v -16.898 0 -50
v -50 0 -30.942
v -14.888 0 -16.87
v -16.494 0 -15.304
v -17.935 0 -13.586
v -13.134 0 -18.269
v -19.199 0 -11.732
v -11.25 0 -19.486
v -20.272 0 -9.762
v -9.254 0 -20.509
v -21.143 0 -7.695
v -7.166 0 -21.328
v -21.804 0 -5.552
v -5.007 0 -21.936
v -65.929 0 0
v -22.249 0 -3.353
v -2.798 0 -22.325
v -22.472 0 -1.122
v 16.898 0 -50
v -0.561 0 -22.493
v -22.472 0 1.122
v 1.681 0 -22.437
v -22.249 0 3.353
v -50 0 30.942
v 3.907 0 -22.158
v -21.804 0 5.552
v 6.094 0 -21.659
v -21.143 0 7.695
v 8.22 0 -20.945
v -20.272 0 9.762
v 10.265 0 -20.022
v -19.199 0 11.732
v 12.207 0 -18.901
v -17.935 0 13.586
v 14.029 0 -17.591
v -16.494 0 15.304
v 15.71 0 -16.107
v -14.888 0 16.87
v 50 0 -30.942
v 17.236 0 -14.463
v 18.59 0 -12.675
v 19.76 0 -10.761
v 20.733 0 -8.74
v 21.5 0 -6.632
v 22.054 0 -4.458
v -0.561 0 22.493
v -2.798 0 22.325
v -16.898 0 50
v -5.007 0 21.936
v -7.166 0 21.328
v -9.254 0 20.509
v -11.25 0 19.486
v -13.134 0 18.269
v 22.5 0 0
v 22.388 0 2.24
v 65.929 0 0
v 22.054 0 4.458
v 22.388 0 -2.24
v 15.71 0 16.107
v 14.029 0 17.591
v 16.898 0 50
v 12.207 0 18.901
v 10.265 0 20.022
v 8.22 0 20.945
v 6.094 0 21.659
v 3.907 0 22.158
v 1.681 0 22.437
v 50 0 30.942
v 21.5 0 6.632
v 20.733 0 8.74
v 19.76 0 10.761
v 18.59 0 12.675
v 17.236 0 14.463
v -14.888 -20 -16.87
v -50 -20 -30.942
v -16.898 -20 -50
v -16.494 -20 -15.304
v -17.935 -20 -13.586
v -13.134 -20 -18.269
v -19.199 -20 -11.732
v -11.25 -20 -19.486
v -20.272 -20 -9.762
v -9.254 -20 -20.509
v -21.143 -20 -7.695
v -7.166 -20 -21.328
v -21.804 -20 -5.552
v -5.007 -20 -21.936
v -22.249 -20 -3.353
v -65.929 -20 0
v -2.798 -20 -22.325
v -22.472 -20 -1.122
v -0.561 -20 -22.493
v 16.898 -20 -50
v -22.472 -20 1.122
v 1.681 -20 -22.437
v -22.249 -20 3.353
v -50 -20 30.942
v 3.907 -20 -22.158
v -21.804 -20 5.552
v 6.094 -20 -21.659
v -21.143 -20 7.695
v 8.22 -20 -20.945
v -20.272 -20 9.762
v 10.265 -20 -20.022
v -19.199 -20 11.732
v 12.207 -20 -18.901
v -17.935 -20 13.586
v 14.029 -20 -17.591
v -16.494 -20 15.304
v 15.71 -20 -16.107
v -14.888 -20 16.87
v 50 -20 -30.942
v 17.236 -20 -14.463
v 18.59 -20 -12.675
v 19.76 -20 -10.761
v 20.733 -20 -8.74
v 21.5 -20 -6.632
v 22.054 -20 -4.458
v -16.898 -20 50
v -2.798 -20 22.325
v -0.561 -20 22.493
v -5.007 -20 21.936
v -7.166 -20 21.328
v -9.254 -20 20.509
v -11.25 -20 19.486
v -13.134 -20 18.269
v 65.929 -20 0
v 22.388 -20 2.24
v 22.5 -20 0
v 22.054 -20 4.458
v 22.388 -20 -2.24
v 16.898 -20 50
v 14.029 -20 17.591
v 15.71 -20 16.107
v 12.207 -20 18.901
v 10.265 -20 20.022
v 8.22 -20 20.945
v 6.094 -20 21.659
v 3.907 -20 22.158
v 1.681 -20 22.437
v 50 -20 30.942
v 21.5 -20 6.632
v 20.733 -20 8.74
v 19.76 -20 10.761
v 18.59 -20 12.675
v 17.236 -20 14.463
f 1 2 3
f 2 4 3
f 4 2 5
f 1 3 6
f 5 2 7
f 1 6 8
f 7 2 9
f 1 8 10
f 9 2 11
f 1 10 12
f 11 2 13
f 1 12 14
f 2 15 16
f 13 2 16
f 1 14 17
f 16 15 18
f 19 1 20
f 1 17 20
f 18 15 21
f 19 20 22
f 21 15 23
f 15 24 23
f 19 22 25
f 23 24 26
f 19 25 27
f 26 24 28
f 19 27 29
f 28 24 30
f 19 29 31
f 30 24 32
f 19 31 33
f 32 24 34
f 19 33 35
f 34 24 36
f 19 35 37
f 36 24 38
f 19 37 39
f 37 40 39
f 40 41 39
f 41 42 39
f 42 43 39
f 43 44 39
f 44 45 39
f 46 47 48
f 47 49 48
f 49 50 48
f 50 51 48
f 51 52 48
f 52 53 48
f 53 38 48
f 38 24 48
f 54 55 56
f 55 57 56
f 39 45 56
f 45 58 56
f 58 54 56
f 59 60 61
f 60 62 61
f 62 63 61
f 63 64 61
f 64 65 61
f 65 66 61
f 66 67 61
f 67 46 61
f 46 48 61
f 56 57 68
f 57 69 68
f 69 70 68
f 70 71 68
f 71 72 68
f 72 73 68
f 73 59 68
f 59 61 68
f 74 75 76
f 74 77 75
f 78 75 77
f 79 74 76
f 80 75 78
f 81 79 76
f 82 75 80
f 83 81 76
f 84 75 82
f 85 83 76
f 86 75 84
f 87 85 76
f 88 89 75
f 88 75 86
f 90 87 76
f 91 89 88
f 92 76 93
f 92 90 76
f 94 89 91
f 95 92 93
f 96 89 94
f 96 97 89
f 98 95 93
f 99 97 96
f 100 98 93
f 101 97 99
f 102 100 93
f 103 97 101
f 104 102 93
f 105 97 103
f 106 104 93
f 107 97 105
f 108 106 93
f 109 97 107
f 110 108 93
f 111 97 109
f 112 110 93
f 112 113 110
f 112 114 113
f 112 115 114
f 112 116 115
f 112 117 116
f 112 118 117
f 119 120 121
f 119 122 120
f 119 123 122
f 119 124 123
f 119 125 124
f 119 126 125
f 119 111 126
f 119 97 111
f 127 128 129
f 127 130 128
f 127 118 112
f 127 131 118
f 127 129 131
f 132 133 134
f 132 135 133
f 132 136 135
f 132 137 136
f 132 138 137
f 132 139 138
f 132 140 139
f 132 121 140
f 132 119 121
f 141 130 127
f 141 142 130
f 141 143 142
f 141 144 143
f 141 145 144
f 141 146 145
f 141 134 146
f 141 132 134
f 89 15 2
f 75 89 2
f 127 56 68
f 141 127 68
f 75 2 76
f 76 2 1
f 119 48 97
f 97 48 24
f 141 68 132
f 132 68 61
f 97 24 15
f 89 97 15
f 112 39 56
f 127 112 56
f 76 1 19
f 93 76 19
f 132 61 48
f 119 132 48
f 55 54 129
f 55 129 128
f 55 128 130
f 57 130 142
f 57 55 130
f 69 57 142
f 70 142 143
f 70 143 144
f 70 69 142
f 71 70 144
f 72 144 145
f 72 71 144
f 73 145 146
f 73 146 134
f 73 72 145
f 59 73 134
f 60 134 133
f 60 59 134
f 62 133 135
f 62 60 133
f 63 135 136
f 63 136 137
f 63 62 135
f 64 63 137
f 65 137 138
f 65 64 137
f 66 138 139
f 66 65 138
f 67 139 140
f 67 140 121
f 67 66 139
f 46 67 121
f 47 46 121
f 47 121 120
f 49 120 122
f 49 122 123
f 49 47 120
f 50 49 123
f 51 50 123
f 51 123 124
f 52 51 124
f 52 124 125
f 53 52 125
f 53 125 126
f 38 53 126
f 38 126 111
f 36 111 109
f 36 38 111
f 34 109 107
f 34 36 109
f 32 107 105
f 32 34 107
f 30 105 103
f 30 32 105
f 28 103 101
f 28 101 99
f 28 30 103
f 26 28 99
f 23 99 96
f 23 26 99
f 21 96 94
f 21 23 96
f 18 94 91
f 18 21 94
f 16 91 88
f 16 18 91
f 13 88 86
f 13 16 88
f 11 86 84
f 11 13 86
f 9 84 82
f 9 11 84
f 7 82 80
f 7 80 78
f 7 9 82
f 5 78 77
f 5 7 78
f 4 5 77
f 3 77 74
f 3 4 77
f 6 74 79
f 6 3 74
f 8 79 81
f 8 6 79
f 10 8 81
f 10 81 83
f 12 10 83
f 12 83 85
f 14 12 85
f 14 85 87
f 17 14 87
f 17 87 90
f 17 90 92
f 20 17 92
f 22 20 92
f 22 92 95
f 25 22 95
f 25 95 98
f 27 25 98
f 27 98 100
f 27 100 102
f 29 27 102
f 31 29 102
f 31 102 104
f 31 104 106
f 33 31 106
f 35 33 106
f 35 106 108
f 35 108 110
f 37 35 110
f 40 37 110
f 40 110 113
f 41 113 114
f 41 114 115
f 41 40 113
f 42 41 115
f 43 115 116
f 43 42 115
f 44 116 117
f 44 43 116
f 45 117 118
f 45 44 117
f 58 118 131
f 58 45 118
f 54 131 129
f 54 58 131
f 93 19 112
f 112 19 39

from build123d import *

# Parameters (mm, degrees)
F0_R     = 22.5
F1_DEPTH = 20


with BuildPart() as f1:
    # F0 (on Front) → F1 (new body)
    with BuildSketch(Plane.XZ):
        Polygon((16.897677, 50), (-16.897677, 50), (-50, 30.941529), (-50, -30.941529), (-16.897677, -50), (16.897677, -50), (50, -30.941529), (50, 30.941529), align=None)
        Circle(F0_R, mode=Mode.SUBTRACT)
        Polygon((-50, -30.941529), (-50, 30.941529), (-65.928897, 0), align=None)
        Polygon((65.928897, 0), (50, 30.941529), (50, -30.941529), align=None)
    extrude(amount=F1_DEPTH)


solid = f1.part
